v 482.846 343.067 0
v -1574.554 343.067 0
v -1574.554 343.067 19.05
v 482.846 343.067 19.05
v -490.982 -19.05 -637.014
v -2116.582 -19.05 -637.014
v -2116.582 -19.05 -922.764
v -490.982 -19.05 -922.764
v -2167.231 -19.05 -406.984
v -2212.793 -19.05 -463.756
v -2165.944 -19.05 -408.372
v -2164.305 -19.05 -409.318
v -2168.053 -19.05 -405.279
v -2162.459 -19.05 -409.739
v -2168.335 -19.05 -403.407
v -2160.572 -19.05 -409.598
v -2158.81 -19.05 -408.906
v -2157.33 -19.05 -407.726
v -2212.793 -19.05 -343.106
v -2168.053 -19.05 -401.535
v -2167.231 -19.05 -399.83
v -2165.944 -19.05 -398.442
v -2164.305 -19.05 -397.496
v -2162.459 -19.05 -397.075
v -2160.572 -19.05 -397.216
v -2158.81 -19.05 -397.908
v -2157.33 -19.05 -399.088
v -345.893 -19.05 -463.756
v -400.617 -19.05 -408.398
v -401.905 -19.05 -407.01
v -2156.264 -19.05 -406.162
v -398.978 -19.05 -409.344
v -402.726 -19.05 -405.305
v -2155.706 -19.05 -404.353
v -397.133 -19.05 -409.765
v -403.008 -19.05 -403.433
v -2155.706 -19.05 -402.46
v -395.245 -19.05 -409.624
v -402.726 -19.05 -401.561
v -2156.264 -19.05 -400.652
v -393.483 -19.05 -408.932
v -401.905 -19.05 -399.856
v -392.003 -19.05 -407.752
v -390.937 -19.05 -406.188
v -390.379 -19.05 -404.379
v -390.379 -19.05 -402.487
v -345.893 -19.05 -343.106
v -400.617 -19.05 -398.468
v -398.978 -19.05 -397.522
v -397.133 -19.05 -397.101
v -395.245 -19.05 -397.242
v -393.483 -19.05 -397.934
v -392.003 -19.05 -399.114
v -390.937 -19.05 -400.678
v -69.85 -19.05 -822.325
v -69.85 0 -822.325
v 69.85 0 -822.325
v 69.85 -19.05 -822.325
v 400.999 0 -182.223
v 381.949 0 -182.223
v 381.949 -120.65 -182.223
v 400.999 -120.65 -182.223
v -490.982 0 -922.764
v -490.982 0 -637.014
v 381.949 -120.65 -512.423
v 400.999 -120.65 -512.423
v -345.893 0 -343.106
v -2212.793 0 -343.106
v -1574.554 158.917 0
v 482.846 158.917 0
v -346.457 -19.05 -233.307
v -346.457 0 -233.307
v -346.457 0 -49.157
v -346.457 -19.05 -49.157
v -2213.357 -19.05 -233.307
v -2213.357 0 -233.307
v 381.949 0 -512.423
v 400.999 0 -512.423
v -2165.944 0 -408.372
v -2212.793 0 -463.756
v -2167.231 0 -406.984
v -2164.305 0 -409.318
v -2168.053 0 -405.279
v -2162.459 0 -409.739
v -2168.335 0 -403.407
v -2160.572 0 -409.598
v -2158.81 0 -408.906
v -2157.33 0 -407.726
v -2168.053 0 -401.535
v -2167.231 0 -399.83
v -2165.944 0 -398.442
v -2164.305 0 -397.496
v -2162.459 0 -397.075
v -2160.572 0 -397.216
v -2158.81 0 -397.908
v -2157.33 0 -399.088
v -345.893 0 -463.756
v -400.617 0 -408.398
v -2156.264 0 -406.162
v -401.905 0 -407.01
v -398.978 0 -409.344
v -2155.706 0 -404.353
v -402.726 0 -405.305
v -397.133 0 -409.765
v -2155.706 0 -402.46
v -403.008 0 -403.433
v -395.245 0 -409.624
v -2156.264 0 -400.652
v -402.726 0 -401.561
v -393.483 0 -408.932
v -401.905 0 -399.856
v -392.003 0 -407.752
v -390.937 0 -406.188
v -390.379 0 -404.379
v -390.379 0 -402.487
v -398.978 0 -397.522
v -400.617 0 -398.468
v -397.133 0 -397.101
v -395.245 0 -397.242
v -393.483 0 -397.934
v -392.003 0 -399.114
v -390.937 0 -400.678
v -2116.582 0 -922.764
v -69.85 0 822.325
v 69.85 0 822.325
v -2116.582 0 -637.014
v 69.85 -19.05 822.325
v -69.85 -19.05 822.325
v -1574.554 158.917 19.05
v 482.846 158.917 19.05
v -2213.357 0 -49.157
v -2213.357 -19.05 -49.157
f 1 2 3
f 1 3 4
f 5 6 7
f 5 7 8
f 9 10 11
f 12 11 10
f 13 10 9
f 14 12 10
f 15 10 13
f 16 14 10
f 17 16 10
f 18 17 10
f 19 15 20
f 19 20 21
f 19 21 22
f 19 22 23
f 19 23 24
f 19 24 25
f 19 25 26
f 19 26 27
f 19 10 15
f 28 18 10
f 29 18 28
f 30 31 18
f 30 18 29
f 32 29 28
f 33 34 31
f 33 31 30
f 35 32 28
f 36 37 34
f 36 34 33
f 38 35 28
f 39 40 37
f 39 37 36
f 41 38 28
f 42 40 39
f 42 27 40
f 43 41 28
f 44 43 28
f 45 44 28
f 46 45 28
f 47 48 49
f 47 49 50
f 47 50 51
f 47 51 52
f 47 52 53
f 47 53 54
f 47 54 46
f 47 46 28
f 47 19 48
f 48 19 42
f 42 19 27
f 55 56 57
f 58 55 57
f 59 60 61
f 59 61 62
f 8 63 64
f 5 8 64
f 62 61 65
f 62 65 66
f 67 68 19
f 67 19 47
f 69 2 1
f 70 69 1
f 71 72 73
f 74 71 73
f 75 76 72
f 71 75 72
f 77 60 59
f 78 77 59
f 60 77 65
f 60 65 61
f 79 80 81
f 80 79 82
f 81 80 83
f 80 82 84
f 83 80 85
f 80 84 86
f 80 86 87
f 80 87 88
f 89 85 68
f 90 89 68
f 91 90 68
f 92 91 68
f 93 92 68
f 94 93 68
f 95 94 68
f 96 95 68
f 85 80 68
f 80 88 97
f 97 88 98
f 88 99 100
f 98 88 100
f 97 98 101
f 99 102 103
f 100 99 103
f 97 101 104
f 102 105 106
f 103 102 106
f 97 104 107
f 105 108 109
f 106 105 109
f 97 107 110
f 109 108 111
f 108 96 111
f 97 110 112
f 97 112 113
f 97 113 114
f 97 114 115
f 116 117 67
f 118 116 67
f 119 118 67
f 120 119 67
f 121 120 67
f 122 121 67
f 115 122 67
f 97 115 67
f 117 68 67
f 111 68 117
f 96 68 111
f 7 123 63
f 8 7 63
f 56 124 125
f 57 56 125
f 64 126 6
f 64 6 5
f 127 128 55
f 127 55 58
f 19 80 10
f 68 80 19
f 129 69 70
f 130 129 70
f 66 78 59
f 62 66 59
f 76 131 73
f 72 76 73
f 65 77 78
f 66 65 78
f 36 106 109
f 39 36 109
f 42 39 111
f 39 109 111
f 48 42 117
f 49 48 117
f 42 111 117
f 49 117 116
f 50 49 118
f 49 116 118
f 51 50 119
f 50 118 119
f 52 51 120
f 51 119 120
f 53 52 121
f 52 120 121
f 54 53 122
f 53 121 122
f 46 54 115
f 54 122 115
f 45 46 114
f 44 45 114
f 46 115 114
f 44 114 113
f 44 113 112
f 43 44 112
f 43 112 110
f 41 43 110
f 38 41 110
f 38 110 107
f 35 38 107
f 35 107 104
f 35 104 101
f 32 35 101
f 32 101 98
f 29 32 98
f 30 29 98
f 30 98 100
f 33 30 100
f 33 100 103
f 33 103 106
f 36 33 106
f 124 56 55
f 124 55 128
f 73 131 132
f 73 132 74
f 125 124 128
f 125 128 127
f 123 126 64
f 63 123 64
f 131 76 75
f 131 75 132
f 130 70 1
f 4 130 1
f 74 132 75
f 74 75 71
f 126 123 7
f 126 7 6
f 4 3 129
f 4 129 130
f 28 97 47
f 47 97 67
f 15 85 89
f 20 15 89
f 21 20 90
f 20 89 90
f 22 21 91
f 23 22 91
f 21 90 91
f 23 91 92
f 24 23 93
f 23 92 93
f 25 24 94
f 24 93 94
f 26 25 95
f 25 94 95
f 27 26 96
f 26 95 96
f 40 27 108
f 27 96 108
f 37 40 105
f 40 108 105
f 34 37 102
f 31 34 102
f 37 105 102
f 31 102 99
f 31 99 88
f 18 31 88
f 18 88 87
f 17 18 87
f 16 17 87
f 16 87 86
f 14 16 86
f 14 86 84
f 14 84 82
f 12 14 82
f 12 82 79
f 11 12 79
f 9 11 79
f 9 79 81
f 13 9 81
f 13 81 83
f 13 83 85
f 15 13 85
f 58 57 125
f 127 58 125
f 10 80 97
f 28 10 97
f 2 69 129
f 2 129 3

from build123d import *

# Parameters (mm, degrees)
F0_W      = 139.7
F0_H      = 1644.65
F1_DEPTH  = 19.05
F2_W      = 2057.4
F2_H      = 184.15
F3_DEPTH  = 19.05
F6_W      = 1866.9
F6_H      = 184.15
F7_DEPTH  = 19.05
F8_W      = 1866.9
F8_H      = 120.65
F9_DEPTH  = 19.05
F10_W     = 19.05
F10_H     = 330.2
F11_DEPTH = 120.65
F14_D     = 12.7
F15_W     = 1625.6
F15_H     = 285.75
F16_DEPTH = 19.05


with BuildPart() as f1:
    # F0 (on Front) → F1 (new body)
    with BuildSketch(Plane.XZ):
        Rectangle(F0_W, F0_H)
    extrude(amount=F1_DEPTH)


with BuildPart() as f3:
    # F2 (on Top) → F3 (new body)
    with BuildSketch(Plane.XY):
        with Locations((-545.853794, 250.992194)):
            Rectangle(F2_W, F2_H)
    extrude(amount=F3_DEPTH)


with BuildPart() as f4_1:
    # F4: copy of F1
    add(f1.part.moved(Location((-459.74, 0, 0))))


with BuildPart() as f7:
    # F6 (on Front) → F7 (new body)
    with BuildSketch(Plane.XZ):
        with Locations((-1279.907092, -141.23211)):
            Rectangle(F6_W, F6_H)
    extrude(amount=F7_DEPTH)


with BuildPart() as f9:
    # F8 (on Front) → F9 (new body)
    with BuildSketch(Plane.XZ):
        with Locations((-1279.34335, -403.431412)):
            Rectangle(F8_W, F8_H)
    extrude(amount=F9_DEPTH)

    # F14 (through all)
    with Locations(Plane.XZ.offset(19.05)):
        with Locations((-2161.984682, -403.406918), (-396.658272, -403.432995)):
            Hole(F14_D / 2)


with BuildPart() as f11:
    # F10 (on Front) → F11 (new body)
    with BuildSketch(Plane.XZ):
        with Locations((391.474263, -347.32341)):
            Rectangle(F10_W, F10_H)
    extrude(amount=F11_DEPTH)


with BuildPart() as f16:
    # F15 (on Front) → F16 (new body)
    with BuildSketch(Plane.XZ):
        with Locations((-1303.781986, -779.88944)):
            Rectangle(F15_W, F15_H)
    extrude(amount=F16_DEPTH)


solid = Compound([f1.part, f3.part, f7.part, f9.part, f11.part, f16.part])
